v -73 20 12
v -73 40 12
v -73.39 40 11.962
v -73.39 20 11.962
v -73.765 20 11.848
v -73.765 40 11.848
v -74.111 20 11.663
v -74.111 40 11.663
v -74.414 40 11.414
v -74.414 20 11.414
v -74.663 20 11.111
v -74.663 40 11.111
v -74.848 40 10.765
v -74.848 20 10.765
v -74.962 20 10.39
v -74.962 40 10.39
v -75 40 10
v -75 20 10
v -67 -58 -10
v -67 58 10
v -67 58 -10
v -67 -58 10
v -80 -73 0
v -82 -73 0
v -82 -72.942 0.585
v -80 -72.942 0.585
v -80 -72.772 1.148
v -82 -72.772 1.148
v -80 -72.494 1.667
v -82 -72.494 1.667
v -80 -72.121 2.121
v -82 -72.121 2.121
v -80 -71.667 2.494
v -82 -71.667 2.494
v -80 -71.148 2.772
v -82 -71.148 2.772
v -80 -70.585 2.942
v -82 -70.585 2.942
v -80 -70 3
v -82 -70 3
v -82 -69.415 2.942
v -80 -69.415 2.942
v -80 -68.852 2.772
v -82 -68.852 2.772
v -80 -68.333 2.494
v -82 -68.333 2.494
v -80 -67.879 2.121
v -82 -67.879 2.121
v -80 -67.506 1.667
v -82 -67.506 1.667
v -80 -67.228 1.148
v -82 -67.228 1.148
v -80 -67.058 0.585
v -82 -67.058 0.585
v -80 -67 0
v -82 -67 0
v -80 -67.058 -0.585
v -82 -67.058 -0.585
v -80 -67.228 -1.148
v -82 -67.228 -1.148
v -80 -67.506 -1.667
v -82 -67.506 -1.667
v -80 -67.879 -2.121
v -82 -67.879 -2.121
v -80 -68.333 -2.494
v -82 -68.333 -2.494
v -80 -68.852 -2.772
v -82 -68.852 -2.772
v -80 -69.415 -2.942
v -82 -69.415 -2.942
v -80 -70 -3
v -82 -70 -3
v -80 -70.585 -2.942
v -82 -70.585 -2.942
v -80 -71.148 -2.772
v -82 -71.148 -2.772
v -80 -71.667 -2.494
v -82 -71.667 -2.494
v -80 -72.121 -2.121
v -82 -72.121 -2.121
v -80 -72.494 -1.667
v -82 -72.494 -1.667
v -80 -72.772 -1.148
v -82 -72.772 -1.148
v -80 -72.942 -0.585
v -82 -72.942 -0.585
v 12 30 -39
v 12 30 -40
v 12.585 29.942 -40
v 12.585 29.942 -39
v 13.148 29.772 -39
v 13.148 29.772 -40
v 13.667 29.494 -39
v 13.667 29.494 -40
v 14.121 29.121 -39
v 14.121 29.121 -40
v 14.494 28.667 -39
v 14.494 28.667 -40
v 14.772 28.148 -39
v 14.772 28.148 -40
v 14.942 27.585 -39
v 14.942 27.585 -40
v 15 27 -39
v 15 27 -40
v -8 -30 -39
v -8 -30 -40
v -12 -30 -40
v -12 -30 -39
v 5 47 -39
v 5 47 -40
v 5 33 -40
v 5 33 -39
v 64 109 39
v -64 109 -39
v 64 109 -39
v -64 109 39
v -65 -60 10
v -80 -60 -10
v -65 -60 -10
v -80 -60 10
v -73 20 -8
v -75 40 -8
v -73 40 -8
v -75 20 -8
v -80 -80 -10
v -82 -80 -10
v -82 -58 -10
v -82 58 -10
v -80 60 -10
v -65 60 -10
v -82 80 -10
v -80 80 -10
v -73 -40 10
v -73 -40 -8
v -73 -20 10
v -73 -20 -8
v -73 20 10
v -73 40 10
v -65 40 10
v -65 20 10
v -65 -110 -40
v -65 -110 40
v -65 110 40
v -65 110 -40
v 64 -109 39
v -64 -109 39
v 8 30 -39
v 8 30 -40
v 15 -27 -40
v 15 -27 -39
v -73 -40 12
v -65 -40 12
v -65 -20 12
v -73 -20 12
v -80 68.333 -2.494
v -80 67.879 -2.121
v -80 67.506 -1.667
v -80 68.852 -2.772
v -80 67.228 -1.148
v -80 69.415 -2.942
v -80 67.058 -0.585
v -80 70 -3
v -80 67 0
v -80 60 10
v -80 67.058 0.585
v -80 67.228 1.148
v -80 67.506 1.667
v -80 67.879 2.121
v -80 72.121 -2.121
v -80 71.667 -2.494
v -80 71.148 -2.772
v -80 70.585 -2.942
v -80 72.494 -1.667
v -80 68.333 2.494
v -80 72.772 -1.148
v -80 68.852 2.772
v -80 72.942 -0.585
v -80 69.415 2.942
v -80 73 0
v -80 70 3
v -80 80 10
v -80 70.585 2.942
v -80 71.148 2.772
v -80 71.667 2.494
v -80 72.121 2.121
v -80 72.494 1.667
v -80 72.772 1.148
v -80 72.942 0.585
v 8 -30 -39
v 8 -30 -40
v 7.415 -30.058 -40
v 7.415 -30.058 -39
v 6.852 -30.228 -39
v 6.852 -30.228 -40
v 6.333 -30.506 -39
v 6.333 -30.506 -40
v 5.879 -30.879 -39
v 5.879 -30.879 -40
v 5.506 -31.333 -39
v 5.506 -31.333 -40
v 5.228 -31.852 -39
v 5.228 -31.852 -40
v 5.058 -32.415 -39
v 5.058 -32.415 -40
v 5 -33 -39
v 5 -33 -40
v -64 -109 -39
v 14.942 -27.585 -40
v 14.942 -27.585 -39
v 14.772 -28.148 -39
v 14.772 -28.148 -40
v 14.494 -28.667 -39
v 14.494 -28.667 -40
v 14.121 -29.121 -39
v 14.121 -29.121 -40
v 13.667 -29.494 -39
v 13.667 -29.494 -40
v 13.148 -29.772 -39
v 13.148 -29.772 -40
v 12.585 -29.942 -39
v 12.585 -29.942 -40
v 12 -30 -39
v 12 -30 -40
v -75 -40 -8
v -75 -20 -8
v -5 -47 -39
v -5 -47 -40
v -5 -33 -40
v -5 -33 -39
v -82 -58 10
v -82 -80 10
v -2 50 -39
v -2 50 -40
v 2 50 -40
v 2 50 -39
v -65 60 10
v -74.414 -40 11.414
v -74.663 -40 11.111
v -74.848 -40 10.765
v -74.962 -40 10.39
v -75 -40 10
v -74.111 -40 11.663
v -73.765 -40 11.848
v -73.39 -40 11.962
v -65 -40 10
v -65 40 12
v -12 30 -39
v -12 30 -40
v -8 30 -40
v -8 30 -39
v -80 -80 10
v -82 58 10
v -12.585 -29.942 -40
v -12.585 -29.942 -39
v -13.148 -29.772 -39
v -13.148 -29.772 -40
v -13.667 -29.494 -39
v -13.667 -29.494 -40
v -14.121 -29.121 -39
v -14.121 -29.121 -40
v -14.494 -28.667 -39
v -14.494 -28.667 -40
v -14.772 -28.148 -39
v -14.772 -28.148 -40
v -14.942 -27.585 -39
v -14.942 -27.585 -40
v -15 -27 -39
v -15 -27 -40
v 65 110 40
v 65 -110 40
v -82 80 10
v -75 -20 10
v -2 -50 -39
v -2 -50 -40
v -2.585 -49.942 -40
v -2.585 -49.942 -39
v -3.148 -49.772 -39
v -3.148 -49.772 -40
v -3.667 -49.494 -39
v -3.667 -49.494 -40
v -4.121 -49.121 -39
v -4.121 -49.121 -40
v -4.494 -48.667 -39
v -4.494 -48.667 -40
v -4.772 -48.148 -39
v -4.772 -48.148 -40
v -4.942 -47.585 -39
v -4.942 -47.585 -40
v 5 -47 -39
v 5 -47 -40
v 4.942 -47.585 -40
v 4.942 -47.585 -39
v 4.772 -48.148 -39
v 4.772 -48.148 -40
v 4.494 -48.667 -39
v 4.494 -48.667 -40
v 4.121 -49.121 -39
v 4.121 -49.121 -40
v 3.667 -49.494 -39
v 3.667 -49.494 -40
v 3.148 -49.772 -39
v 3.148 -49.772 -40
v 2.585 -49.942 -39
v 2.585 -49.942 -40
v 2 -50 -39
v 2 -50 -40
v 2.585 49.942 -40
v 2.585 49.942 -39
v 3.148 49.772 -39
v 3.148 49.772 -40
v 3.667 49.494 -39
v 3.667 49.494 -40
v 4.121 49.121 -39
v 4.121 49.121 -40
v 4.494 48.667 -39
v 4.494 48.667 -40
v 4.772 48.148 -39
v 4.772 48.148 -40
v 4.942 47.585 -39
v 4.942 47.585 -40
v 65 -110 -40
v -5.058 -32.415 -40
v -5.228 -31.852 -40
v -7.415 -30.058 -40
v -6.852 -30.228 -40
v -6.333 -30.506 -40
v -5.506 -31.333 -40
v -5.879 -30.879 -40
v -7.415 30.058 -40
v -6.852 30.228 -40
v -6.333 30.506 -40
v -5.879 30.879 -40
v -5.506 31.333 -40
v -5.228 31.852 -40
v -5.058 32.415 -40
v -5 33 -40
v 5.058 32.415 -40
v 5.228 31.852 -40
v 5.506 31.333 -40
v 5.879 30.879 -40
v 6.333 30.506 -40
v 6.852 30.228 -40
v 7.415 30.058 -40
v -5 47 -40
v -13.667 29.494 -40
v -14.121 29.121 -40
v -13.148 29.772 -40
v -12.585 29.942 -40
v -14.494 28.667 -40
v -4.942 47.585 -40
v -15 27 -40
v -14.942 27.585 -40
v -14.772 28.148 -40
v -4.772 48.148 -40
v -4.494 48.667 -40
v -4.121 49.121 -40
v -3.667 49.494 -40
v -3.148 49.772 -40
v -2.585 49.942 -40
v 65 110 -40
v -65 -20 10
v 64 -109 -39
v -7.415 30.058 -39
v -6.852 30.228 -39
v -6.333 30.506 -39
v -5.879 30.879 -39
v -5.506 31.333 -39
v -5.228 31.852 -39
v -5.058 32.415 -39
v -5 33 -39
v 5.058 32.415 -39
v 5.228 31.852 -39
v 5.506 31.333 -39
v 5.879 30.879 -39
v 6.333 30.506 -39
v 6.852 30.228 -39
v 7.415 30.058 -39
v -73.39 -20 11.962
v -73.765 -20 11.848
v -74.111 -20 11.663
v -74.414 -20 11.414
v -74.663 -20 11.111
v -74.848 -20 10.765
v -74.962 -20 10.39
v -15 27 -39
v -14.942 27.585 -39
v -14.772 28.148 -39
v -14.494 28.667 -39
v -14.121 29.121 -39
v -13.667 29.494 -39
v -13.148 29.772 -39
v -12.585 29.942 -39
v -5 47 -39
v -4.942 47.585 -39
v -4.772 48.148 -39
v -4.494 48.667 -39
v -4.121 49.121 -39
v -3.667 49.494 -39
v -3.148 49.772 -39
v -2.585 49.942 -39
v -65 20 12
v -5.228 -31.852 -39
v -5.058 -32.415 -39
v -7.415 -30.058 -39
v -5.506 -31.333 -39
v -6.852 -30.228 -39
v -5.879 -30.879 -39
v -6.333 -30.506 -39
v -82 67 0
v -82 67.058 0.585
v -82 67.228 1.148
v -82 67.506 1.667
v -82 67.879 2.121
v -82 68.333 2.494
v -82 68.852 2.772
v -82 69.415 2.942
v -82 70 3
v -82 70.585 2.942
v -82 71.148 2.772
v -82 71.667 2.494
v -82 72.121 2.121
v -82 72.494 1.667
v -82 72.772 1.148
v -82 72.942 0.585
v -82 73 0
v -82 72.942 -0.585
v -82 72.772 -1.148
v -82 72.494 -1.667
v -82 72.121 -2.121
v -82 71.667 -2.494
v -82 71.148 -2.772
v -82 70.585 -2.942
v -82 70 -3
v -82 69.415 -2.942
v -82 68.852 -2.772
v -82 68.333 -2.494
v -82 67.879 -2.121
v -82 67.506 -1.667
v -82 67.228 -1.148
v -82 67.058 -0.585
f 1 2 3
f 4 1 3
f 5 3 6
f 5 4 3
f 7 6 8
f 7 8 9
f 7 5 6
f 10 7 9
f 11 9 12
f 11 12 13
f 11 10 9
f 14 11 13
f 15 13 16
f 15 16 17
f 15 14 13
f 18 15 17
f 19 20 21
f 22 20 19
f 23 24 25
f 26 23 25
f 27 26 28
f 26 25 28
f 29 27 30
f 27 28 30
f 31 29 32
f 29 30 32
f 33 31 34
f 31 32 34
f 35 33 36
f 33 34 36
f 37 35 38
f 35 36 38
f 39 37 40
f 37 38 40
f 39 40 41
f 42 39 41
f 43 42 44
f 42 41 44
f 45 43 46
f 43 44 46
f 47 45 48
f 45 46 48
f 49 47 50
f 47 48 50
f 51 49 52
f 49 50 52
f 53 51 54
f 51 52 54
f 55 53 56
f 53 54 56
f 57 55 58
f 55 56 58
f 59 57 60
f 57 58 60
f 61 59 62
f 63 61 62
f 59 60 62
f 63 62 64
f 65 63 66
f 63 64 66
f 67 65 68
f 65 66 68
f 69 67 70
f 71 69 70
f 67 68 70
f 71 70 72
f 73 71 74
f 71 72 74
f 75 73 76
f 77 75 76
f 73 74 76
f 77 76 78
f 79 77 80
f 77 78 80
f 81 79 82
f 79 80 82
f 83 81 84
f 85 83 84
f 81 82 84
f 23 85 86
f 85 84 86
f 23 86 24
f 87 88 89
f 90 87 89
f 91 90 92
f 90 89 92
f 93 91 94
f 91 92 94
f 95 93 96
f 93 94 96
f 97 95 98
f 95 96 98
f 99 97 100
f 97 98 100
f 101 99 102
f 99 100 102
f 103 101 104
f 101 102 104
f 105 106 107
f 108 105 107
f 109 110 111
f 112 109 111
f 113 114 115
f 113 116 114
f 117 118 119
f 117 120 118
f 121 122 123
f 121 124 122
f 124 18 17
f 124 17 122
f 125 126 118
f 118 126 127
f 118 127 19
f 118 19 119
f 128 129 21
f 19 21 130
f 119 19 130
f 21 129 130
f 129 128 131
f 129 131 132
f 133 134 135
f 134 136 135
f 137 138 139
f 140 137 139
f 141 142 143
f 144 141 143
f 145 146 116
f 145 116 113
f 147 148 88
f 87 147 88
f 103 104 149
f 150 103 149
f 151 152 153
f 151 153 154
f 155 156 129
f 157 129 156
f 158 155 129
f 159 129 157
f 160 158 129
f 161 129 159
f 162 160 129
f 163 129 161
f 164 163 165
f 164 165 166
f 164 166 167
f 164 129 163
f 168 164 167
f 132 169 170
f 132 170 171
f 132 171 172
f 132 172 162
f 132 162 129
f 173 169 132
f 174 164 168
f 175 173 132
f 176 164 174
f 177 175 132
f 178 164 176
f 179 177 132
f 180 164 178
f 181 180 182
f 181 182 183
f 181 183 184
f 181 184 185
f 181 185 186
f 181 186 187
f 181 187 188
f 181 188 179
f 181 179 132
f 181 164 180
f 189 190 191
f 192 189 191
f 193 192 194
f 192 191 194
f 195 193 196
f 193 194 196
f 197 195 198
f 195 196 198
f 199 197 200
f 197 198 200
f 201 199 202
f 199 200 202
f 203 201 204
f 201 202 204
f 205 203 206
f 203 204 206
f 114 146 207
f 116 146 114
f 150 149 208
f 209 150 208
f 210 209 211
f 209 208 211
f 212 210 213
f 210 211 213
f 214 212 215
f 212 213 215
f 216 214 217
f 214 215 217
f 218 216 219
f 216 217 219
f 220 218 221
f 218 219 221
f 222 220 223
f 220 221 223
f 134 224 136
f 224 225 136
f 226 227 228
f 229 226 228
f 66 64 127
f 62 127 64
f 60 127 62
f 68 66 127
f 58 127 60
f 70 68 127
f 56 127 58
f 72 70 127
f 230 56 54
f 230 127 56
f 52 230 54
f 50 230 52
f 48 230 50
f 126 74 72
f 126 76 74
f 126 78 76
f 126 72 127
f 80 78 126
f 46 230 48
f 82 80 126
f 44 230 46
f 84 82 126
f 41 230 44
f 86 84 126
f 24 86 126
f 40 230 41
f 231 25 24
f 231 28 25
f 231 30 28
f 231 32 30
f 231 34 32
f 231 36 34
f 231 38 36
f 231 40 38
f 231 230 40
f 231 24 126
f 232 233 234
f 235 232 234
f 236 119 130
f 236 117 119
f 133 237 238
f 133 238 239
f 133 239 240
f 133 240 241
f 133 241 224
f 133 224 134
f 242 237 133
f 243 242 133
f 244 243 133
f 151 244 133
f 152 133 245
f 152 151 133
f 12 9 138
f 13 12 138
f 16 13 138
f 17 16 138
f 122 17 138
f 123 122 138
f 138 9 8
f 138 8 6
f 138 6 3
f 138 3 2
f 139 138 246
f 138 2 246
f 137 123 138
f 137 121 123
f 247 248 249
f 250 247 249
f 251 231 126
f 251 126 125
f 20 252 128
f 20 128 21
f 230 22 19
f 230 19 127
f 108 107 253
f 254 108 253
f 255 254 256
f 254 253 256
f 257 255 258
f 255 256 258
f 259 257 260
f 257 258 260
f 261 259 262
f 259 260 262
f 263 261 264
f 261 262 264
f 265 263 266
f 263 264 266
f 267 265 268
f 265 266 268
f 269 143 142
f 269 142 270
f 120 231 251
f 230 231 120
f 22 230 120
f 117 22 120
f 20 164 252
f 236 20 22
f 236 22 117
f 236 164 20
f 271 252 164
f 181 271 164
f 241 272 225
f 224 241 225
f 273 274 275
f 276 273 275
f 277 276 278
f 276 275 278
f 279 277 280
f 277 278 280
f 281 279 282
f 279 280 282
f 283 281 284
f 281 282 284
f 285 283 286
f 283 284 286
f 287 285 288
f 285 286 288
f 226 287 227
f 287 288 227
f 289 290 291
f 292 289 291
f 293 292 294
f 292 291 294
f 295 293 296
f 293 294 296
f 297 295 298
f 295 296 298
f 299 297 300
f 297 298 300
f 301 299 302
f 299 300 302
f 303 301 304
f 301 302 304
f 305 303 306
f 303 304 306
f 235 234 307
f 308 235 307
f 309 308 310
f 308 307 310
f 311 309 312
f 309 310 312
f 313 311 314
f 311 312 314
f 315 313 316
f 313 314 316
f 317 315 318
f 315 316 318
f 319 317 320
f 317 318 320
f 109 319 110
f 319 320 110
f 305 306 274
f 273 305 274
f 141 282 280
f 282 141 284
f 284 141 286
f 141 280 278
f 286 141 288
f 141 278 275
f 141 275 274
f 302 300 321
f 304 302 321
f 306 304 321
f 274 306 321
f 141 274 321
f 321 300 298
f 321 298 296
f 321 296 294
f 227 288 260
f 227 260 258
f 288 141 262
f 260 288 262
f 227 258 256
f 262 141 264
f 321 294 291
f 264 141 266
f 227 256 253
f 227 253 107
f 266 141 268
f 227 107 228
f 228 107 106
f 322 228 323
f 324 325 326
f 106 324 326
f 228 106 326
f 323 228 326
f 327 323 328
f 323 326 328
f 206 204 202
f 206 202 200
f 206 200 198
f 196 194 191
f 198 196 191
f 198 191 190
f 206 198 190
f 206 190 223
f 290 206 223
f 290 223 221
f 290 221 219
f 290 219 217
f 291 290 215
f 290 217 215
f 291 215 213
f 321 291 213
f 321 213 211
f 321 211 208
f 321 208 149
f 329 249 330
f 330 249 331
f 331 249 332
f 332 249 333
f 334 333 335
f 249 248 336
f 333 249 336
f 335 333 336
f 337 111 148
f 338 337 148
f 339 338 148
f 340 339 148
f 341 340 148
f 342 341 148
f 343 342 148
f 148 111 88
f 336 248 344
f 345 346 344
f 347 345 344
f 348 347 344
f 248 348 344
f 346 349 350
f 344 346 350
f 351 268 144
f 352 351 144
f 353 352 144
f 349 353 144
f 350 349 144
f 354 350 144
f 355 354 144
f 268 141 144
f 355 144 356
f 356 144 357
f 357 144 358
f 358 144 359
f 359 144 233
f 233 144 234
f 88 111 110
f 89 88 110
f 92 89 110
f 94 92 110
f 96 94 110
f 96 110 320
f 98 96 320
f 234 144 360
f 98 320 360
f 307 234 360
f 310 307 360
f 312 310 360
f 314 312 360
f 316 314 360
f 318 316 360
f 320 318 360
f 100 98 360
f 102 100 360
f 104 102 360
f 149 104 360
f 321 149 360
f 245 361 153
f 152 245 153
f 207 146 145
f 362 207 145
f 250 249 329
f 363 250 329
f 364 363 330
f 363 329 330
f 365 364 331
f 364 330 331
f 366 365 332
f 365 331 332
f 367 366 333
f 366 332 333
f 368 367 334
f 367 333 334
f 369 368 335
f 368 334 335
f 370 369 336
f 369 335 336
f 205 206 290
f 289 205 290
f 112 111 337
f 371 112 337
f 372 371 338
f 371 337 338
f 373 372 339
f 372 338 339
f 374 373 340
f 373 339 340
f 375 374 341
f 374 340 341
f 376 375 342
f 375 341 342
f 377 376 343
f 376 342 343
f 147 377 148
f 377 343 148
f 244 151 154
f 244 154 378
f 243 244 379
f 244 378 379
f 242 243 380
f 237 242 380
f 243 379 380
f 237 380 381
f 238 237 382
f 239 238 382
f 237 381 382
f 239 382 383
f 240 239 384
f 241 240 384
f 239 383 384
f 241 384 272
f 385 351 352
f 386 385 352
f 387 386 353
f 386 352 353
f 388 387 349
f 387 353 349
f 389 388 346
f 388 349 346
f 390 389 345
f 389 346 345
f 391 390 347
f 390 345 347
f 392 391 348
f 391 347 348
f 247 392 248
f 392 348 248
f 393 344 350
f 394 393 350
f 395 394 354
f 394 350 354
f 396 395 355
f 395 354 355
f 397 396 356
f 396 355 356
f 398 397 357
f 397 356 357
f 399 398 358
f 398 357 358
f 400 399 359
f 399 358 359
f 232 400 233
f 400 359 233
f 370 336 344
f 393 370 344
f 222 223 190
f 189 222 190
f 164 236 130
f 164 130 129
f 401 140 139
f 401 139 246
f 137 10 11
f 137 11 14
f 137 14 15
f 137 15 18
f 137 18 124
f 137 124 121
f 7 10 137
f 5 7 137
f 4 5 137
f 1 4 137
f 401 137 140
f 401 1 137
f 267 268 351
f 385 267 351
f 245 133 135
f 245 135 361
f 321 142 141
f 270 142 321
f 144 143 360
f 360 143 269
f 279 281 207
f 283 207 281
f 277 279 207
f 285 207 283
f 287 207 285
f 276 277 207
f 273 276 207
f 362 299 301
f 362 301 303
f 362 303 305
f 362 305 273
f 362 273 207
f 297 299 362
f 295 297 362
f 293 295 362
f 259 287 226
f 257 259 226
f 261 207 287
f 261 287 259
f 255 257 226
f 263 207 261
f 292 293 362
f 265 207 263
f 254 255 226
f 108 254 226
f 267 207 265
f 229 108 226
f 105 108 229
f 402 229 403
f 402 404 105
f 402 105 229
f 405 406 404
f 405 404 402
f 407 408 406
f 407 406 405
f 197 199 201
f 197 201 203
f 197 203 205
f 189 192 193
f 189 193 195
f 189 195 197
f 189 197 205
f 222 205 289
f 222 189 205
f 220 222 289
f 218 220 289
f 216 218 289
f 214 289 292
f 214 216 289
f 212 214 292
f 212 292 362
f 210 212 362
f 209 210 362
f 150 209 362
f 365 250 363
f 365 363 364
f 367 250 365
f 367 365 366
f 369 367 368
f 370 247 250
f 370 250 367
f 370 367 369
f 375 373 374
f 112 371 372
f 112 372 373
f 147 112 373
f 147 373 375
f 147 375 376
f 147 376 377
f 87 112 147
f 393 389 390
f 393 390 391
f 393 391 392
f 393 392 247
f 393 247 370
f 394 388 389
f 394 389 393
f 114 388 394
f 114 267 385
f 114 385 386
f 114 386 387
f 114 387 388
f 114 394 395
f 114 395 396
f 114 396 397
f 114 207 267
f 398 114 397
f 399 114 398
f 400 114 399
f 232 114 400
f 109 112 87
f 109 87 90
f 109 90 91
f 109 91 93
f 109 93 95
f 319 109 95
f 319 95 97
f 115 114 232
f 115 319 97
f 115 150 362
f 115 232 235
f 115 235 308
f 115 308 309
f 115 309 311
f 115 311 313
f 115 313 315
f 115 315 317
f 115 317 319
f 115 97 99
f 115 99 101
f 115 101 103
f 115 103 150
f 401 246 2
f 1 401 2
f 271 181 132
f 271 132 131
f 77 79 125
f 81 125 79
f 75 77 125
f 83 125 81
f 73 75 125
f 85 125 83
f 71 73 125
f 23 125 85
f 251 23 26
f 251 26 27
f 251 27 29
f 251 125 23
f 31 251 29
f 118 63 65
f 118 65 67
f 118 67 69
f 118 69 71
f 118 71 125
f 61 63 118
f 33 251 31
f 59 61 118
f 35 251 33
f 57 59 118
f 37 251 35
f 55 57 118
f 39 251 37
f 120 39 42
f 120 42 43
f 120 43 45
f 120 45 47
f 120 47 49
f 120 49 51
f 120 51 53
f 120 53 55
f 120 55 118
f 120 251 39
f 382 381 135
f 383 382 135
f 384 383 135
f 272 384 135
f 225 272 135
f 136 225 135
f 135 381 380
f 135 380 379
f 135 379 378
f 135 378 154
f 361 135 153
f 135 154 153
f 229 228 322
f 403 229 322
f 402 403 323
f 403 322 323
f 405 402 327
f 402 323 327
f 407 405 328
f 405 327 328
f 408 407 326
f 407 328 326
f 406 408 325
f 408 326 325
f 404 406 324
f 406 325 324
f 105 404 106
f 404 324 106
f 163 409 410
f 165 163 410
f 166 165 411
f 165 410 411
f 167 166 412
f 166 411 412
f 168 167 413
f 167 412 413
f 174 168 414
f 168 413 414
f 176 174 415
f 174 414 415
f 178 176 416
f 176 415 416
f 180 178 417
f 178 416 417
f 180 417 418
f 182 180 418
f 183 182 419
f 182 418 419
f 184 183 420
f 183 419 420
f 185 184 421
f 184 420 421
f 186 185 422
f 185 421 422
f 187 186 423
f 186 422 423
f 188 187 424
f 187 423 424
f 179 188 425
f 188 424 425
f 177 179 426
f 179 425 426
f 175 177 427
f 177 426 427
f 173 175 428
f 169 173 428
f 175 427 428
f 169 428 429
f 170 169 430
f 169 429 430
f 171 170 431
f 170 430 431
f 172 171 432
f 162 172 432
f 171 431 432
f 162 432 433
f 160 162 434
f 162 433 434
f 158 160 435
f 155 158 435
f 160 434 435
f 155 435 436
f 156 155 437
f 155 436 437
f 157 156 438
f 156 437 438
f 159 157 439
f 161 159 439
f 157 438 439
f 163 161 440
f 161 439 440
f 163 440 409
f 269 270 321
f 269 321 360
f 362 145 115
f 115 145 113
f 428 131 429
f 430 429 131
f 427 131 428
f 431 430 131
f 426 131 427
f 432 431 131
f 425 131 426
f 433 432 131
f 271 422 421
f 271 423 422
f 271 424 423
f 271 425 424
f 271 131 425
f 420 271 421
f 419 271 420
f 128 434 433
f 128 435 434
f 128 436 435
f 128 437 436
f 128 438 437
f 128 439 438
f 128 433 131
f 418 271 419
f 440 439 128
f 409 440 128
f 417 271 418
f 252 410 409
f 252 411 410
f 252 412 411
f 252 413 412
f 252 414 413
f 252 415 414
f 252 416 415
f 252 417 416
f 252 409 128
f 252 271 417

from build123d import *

# Parameters (mm, degrees)
F0_W      = 130
F0_H      = 220
F1_DEPTH  = 40
F2_T      = -1
F4_DEPTH  = 1
F6_DEPTH  = 10
F7_R      = 3
F8_DEPTH  = 2
F11_DEPTH = 10


with BuildPart() as f1:
    # F0 (on Top) → F1 (new body, symmetric)
    with BuildSketch(Plane.XY):
        Rectangle(F0_W, F0_H)
    extrude(amount=F1_DEPTH, both=True)

    # F2 (hollow: no face is removed)
    offset(amount=F2_T, mode=Mode.SUBTRACT)

    # F3 (on face) → F4 (cut, through all)
    with BuildSketch(Plane(origin=(0, 0, -40), x_dir=(1, 0, 0), z_dir=(0, 0, -1))):
        with BuildLine():
            Line((2, 50), (-2, 50))
            ThreePointArc((-2, 50), (-4.1213203436, 49.1213203436), (-5, 47))
            Line((-5, 47), (-5, 33))
            ThreePointArc((-5, 33), (-5.8786796564, 30.8786796564), (-8, 30))
            Line((-8, 30), (-12, 30))
            ThreePointArc((-12, 30), (-14.1213203436, 29.1213203436), (-15, 27))
            Line((-15, 27), (-15, -27))
            ThreePointArc((-15, -27), (-14.1213203436, -29.1213203436), (-12, -30))
            Line((-12, -30), (-8, -30))
            ThreePointArc((-8, -30), (-5.8786796564, -30.8786796564), (-5, -33))
            Line((-5, -33), (-5, -47))
            ThreePointArc((-5, -47), (-4.1213203436, -49.1213203436), (-2, -50))
            Line((-2, -50), (2, -50))
            ThreePointArc((2, -50), (4.1213203436, -49.1213203436), (5, -47))
            Line((5, -47), (5, -33))
            ThreePointArc((5, -33), (5.8786796564, -30.8786796564), (8, -30))
            Line((8, -30), (12, -30))
            ThreePointArc((12, -30), (14.1213203436, -29.1213203436), (15, -27))
            Line((15, -27), (15, 27))
            ThreePointArc((15, 27), (14.1213203436, 29.1213203436), (12, 30))
            Line((12, 30), (8, 30))
            ThreePointArc((8, 30), (5.8786796564, 30.8786796564), (5, 33))
            Line((5, 33), (5, 47))
            ThreePointArc((5, 47), (4.1213203436, 49.1213203436), (2, 50))
        make_face()
    extrude(amount=-F4_DEPTH, mode=Mode.SUBTRACT)


with BuildPart() as f6:
    # F5 (on Top) → F6 (new body, symmetric)
    with BuildSketch(Plane.XY):
        Polygon((-65, -60), (-65, 60), (-80, 60), (-80, 80), (-82, 80), (-82, 58), (-67, 58), (-67, -58), (-82, -58), (-82, -80), (-80, -80), (-80, -60), align=None)
    extrude(amount=F6_DEPTH, both=True)

    # F7 (on face) → F8 (cut, through all)
    with BuildSketch(Plane(origin=(-82, 0, 0), x_dir=(0, -1, 0), z_dir=(-1, 0, 0))):
        with Locations((-70, 0)):
            Circle(F7_R)
        with Locations((70, 0)):
            Circle(F7_R)
    extrude(amount=-F8_DEPTH, mode=Mode.SUBTRACT)


with BuildPart() as f11:
    # F10 (on offset) → F11 (new body, symmetric)
    with BuildSketch(Plane.XZ.offset(-30)):
        with BuildLine():
            Line((-73, 10), (-65, 10))
            Line((-65, 10), (-65, 12))
            Line((-65, 12), (-73, 12))
            ThreePointArc((-73, 12), (-74.4142135624, 11.4142135624), (-75, 10))
            Line((-75, 10), (-75, -8))
            Line((-75, -8), (-73, -8))
            Line((-73, -8), (-73, 10))
        make_face()
    extrude(amount=F11_DEPTH, both=True)


with BuildPart() as f12_1:
    # F12: instance of F11
    add(f11.part.mirror(Plane.XZ))


solid = Compound([f1.part, f6.part, f11.part, f12_1.part])
